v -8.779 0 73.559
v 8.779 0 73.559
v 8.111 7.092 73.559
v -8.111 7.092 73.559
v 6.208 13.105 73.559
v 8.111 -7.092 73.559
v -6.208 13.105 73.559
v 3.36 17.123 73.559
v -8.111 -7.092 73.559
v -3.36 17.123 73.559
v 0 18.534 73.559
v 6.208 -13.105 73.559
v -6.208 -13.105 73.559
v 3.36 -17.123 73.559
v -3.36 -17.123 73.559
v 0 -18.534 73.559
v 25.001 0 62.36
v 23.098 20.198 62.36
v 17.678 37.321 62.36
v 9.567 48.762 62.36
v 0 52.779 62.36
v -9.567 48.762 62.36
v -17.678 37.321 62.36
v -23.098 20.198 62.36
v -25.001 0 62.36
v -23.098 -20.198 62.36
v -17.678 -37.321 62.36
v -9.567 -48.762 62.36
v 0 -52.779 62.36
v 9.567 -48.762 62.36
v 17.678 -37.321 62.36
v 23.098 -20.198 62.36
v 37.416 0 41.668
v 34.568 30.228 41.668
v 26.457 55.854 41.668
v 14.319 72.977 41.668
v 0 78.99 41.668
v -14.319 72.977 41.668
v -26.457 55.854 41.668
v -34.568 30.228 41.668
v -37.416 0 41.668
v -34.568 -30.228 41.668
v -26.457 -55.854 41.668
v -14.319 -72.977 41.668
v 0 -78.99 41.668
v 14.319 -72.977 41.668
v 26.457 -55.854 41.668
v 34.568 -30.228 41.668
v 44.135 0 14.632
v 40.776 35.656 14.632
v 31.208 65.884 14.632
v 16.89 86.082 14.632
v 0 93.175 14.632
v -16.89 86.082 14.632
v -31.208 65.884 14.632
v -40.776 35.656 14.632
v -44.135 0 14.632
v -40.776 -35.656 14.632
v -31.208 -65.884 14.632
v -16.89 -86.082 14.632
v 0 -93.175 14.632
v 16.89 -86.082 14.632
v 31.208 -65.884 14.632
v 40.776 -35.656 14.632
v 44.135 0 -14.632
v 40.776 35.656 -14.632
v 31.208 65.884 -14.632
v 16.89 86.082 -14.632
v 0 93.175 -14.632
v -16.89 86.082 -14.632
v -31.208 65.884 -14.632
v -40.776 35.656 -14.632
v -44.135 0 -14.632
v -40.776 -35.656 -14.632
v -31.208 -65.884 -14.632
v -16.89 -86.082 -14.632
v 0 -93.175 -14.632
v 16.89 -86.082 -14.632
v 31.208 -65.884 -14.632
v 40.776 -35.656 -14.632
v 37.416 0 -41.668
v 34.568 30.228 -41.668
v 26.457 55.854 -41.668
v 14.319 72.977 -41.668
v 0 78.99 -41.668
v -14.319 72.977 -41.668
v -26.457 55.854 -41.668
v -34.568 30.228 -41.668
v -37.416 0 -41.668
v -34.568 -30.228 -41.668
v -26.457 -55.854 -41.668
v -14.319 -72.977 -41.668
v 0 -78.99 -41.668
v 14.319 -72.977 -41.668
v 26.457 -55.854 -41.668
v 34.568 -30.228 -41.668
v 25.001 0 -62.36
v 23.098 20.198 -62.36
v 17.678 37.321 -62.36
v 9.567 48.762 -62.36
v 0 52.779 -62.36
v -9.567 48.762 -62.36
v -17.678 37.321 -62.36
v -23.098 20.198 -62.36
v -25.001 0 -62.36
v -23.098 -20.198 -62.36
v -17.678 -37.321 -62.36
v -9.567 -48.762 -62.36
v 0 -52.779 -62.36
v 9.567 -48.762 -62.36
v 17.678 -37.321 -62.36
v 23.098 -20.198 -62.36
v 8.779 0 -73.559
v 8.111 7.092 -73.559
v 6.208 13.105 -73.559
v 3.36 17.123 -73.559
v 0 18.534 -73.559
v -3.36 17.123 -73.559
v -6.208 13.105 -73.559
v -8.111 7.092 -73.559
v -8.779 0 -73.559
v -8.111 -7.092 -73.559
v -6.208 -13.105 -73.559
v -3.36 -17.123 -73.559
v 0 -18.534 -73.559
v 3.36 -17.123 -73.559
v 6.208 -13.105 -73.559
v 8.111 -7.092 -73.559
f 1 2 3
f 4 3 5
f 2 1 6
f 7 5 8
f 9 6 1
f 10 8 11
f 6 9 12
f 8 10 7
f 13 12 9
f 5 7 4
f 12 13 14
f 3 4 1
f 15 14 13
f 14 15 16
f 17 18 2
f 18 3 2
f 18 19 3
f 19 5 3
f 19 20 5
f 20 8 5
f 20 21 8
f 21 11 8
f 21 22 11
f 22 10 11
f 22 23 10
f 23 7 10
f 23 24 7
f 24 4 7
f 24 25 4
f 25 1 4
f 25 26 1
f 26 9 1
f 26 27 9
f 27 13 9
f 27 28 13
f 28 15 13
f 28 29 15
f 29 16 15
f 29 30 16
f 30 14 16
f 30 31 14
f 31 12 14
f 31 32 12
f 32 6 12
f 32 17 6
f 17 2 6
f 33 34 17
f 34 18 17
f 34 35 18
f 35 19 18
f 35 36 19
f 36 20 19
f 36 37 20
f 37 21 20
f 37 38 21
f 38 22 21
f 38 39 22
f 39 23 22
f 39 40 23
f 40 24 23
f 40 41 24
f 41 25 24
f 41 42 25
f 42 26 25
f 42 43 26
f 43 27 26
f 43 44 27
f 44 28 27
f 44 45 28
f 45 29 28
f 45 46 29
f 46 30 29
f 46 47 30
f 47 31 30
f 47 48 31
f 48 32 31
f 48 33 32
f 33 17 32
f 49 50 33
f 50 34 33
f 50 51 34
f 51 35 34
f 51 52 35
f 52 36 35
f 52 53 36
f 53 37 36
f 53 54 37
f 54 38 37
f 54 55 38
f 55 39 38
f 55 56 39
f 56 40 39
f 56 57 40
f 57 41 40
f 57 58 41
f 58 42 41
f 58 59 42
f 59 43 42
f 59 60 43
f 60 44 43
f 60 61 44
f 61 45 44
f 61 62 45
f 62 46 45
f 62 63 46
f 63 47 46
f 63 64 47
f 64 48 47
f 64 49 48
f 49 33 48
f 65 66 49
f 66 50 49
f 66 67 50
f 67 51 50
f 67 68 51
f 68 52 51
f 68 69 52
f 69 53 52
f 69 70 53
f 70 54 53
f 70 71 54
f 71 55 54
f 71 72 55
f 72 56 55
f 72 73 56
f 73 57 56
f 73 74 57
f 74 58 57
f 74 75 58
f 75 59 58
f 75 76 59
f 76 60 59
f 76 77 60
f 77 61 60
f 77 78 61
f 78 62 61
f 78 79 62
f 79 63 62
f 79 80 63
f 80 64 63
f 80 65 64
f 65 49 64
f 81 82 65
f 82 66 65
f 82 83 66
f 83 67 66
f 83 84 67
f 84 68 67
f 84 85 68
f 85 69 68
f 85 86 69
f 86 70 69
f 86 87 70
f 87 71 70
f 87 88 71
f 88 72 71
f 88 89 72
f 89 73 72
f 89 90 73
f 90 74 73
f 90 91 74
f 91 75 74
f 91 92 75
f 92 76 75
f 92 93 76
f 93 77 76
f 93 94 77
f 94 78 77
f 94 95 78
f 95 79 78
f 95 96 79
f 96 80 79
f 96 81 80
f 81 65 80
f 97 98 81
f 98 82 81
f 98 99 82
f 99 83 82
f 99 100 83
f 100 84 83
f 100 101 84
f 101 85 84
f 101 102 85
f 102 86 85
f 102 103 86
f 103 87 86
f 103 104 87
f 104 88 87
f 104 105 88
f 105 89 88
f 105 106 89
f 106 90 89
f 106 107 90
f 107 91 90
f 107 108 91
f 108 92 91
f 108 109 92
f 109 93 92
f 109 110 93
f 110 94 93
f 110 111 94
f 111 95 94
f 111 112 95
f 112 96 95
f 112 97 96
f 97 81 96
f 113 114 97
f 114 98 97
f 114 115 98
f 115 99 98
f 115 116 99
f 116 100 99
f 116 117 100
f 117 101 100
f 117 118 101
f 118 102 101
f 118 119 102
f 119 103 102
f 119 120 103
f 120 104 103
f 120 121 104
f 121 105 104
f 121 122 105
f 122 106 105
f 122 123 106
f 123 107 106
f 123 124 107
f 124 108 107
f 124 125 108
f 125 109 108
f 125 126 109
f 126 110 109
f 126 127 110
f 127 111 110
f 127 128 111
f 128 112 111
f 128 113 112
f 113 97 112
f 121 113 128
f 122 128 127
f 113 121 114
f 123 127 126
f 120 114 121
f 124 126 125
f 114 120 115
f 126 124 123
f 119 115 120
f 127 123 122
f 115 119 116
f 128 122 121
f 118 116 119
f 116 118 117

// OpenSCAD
// Generated by SolidPython 1.0.1 on 2020-07-29 00:46:49


scale(v = [9, 19, 15]) {
	sphere(r = 5);
}
/***********************************************
*********      SolidPython code:      **********
************************************************
 
# import packages: SolidPython
from solid import *
from solid.utils import *
from itertools import chain, combinations, permutations


class Resize:

    def __init__(self, scad_file):
        self.scad_file = scad_file
        #self.scad_file = import_scad(scad_file)
        # cone/cylinder param:
        self.r1 = 0
        self.r2 = 0
        self.h = 0
        # rectangular prism param:
        self.w = 0
        self.l = 0
        # ellipse param:
        self.r = 0

    # import OpenScad code (file name corresponds to shape)


    # classify shape + parameters
    def assign(self, param1, param2, param3):
        if self.scad_file == 'cone.scad':
            self.r1 = param1
            self.r2 = param2
            self.h = param3
        elif self.scad_file == 'cylinder.scad':
            self.r1 = param1
            self.r2 = param2
            self.h = param3
        elif self.scad_file == 'rectangularPrism.scad':
            self.h = param1
            self.l = param2
            self.w = param3
        else:
            self.r = param1
            self.h = param2

    # resize parameters
    def iterate(self):
        x = range(3, 20, 2)
        i = 1
        if self.scad_file == 'cone.scad':
            tempList = list(permutations(x, 2))
            for temp in tempList:
                param1 = temp[0]
                param2 = temp[1]
                filepath = 'produced_scad_files/' + 'cone' + str(param1) + '_' + str(param2) + '_' + '.scad'
                scad_render_to_file(cylinder(h=param1, r1=param2, r2=0), filepath)

        elif self.scad_file == 'cylinder.scad':
            tempList = list(permutations(x, 3))
            for temp in tempList:
                param1 = temp[0]
                param2 = temp[1]
                filepath = 'produced_scad_files/' + 'cylinder' + str(param1) + '_' + str(param2) + '_' + '.scad'
                scad_render_to_file(cylinder(h=param1, r1=param2, r2=param2), filepath)

        elif self.scad_file == 'rectangularPrism.scad':
            tempList = list(permutations(x, 3))
            for temp in tempList:
                param1 = temp[0]
                param2 = temp[1]
                param3 = temp[2]
                filepath = 'produced_scad_files/' + 'rectangularPrism' + str(param1) + '_' + str(param2) + '_' + str(
                    param3) + '.scad'
                scad_render_to_file(cube(size=(param1, param2, param3)), filepath)

        elif self.scad_file == 'ellipse.scad':
            tempList = list(permutations(x, 4))
            for temp in tempList:
                param1 = temp[0]
                param2 = temp[1]
                param3 = temp[2]
                param4 = temp[3]
                filepath = 'produced_scad_files/' + 'ellipse' + str(param1) + '_' + str(param2) + '_' + str(param3) + '_' + str(param4) + '.scad'
                scad_render_to_file(scale([param1, param2, param3])(sphere(r=param4)), filepath)

    def render_to_scadfile(self):
        scad_render_to_file(scad, 'example.scad') 
 
************************************************/
